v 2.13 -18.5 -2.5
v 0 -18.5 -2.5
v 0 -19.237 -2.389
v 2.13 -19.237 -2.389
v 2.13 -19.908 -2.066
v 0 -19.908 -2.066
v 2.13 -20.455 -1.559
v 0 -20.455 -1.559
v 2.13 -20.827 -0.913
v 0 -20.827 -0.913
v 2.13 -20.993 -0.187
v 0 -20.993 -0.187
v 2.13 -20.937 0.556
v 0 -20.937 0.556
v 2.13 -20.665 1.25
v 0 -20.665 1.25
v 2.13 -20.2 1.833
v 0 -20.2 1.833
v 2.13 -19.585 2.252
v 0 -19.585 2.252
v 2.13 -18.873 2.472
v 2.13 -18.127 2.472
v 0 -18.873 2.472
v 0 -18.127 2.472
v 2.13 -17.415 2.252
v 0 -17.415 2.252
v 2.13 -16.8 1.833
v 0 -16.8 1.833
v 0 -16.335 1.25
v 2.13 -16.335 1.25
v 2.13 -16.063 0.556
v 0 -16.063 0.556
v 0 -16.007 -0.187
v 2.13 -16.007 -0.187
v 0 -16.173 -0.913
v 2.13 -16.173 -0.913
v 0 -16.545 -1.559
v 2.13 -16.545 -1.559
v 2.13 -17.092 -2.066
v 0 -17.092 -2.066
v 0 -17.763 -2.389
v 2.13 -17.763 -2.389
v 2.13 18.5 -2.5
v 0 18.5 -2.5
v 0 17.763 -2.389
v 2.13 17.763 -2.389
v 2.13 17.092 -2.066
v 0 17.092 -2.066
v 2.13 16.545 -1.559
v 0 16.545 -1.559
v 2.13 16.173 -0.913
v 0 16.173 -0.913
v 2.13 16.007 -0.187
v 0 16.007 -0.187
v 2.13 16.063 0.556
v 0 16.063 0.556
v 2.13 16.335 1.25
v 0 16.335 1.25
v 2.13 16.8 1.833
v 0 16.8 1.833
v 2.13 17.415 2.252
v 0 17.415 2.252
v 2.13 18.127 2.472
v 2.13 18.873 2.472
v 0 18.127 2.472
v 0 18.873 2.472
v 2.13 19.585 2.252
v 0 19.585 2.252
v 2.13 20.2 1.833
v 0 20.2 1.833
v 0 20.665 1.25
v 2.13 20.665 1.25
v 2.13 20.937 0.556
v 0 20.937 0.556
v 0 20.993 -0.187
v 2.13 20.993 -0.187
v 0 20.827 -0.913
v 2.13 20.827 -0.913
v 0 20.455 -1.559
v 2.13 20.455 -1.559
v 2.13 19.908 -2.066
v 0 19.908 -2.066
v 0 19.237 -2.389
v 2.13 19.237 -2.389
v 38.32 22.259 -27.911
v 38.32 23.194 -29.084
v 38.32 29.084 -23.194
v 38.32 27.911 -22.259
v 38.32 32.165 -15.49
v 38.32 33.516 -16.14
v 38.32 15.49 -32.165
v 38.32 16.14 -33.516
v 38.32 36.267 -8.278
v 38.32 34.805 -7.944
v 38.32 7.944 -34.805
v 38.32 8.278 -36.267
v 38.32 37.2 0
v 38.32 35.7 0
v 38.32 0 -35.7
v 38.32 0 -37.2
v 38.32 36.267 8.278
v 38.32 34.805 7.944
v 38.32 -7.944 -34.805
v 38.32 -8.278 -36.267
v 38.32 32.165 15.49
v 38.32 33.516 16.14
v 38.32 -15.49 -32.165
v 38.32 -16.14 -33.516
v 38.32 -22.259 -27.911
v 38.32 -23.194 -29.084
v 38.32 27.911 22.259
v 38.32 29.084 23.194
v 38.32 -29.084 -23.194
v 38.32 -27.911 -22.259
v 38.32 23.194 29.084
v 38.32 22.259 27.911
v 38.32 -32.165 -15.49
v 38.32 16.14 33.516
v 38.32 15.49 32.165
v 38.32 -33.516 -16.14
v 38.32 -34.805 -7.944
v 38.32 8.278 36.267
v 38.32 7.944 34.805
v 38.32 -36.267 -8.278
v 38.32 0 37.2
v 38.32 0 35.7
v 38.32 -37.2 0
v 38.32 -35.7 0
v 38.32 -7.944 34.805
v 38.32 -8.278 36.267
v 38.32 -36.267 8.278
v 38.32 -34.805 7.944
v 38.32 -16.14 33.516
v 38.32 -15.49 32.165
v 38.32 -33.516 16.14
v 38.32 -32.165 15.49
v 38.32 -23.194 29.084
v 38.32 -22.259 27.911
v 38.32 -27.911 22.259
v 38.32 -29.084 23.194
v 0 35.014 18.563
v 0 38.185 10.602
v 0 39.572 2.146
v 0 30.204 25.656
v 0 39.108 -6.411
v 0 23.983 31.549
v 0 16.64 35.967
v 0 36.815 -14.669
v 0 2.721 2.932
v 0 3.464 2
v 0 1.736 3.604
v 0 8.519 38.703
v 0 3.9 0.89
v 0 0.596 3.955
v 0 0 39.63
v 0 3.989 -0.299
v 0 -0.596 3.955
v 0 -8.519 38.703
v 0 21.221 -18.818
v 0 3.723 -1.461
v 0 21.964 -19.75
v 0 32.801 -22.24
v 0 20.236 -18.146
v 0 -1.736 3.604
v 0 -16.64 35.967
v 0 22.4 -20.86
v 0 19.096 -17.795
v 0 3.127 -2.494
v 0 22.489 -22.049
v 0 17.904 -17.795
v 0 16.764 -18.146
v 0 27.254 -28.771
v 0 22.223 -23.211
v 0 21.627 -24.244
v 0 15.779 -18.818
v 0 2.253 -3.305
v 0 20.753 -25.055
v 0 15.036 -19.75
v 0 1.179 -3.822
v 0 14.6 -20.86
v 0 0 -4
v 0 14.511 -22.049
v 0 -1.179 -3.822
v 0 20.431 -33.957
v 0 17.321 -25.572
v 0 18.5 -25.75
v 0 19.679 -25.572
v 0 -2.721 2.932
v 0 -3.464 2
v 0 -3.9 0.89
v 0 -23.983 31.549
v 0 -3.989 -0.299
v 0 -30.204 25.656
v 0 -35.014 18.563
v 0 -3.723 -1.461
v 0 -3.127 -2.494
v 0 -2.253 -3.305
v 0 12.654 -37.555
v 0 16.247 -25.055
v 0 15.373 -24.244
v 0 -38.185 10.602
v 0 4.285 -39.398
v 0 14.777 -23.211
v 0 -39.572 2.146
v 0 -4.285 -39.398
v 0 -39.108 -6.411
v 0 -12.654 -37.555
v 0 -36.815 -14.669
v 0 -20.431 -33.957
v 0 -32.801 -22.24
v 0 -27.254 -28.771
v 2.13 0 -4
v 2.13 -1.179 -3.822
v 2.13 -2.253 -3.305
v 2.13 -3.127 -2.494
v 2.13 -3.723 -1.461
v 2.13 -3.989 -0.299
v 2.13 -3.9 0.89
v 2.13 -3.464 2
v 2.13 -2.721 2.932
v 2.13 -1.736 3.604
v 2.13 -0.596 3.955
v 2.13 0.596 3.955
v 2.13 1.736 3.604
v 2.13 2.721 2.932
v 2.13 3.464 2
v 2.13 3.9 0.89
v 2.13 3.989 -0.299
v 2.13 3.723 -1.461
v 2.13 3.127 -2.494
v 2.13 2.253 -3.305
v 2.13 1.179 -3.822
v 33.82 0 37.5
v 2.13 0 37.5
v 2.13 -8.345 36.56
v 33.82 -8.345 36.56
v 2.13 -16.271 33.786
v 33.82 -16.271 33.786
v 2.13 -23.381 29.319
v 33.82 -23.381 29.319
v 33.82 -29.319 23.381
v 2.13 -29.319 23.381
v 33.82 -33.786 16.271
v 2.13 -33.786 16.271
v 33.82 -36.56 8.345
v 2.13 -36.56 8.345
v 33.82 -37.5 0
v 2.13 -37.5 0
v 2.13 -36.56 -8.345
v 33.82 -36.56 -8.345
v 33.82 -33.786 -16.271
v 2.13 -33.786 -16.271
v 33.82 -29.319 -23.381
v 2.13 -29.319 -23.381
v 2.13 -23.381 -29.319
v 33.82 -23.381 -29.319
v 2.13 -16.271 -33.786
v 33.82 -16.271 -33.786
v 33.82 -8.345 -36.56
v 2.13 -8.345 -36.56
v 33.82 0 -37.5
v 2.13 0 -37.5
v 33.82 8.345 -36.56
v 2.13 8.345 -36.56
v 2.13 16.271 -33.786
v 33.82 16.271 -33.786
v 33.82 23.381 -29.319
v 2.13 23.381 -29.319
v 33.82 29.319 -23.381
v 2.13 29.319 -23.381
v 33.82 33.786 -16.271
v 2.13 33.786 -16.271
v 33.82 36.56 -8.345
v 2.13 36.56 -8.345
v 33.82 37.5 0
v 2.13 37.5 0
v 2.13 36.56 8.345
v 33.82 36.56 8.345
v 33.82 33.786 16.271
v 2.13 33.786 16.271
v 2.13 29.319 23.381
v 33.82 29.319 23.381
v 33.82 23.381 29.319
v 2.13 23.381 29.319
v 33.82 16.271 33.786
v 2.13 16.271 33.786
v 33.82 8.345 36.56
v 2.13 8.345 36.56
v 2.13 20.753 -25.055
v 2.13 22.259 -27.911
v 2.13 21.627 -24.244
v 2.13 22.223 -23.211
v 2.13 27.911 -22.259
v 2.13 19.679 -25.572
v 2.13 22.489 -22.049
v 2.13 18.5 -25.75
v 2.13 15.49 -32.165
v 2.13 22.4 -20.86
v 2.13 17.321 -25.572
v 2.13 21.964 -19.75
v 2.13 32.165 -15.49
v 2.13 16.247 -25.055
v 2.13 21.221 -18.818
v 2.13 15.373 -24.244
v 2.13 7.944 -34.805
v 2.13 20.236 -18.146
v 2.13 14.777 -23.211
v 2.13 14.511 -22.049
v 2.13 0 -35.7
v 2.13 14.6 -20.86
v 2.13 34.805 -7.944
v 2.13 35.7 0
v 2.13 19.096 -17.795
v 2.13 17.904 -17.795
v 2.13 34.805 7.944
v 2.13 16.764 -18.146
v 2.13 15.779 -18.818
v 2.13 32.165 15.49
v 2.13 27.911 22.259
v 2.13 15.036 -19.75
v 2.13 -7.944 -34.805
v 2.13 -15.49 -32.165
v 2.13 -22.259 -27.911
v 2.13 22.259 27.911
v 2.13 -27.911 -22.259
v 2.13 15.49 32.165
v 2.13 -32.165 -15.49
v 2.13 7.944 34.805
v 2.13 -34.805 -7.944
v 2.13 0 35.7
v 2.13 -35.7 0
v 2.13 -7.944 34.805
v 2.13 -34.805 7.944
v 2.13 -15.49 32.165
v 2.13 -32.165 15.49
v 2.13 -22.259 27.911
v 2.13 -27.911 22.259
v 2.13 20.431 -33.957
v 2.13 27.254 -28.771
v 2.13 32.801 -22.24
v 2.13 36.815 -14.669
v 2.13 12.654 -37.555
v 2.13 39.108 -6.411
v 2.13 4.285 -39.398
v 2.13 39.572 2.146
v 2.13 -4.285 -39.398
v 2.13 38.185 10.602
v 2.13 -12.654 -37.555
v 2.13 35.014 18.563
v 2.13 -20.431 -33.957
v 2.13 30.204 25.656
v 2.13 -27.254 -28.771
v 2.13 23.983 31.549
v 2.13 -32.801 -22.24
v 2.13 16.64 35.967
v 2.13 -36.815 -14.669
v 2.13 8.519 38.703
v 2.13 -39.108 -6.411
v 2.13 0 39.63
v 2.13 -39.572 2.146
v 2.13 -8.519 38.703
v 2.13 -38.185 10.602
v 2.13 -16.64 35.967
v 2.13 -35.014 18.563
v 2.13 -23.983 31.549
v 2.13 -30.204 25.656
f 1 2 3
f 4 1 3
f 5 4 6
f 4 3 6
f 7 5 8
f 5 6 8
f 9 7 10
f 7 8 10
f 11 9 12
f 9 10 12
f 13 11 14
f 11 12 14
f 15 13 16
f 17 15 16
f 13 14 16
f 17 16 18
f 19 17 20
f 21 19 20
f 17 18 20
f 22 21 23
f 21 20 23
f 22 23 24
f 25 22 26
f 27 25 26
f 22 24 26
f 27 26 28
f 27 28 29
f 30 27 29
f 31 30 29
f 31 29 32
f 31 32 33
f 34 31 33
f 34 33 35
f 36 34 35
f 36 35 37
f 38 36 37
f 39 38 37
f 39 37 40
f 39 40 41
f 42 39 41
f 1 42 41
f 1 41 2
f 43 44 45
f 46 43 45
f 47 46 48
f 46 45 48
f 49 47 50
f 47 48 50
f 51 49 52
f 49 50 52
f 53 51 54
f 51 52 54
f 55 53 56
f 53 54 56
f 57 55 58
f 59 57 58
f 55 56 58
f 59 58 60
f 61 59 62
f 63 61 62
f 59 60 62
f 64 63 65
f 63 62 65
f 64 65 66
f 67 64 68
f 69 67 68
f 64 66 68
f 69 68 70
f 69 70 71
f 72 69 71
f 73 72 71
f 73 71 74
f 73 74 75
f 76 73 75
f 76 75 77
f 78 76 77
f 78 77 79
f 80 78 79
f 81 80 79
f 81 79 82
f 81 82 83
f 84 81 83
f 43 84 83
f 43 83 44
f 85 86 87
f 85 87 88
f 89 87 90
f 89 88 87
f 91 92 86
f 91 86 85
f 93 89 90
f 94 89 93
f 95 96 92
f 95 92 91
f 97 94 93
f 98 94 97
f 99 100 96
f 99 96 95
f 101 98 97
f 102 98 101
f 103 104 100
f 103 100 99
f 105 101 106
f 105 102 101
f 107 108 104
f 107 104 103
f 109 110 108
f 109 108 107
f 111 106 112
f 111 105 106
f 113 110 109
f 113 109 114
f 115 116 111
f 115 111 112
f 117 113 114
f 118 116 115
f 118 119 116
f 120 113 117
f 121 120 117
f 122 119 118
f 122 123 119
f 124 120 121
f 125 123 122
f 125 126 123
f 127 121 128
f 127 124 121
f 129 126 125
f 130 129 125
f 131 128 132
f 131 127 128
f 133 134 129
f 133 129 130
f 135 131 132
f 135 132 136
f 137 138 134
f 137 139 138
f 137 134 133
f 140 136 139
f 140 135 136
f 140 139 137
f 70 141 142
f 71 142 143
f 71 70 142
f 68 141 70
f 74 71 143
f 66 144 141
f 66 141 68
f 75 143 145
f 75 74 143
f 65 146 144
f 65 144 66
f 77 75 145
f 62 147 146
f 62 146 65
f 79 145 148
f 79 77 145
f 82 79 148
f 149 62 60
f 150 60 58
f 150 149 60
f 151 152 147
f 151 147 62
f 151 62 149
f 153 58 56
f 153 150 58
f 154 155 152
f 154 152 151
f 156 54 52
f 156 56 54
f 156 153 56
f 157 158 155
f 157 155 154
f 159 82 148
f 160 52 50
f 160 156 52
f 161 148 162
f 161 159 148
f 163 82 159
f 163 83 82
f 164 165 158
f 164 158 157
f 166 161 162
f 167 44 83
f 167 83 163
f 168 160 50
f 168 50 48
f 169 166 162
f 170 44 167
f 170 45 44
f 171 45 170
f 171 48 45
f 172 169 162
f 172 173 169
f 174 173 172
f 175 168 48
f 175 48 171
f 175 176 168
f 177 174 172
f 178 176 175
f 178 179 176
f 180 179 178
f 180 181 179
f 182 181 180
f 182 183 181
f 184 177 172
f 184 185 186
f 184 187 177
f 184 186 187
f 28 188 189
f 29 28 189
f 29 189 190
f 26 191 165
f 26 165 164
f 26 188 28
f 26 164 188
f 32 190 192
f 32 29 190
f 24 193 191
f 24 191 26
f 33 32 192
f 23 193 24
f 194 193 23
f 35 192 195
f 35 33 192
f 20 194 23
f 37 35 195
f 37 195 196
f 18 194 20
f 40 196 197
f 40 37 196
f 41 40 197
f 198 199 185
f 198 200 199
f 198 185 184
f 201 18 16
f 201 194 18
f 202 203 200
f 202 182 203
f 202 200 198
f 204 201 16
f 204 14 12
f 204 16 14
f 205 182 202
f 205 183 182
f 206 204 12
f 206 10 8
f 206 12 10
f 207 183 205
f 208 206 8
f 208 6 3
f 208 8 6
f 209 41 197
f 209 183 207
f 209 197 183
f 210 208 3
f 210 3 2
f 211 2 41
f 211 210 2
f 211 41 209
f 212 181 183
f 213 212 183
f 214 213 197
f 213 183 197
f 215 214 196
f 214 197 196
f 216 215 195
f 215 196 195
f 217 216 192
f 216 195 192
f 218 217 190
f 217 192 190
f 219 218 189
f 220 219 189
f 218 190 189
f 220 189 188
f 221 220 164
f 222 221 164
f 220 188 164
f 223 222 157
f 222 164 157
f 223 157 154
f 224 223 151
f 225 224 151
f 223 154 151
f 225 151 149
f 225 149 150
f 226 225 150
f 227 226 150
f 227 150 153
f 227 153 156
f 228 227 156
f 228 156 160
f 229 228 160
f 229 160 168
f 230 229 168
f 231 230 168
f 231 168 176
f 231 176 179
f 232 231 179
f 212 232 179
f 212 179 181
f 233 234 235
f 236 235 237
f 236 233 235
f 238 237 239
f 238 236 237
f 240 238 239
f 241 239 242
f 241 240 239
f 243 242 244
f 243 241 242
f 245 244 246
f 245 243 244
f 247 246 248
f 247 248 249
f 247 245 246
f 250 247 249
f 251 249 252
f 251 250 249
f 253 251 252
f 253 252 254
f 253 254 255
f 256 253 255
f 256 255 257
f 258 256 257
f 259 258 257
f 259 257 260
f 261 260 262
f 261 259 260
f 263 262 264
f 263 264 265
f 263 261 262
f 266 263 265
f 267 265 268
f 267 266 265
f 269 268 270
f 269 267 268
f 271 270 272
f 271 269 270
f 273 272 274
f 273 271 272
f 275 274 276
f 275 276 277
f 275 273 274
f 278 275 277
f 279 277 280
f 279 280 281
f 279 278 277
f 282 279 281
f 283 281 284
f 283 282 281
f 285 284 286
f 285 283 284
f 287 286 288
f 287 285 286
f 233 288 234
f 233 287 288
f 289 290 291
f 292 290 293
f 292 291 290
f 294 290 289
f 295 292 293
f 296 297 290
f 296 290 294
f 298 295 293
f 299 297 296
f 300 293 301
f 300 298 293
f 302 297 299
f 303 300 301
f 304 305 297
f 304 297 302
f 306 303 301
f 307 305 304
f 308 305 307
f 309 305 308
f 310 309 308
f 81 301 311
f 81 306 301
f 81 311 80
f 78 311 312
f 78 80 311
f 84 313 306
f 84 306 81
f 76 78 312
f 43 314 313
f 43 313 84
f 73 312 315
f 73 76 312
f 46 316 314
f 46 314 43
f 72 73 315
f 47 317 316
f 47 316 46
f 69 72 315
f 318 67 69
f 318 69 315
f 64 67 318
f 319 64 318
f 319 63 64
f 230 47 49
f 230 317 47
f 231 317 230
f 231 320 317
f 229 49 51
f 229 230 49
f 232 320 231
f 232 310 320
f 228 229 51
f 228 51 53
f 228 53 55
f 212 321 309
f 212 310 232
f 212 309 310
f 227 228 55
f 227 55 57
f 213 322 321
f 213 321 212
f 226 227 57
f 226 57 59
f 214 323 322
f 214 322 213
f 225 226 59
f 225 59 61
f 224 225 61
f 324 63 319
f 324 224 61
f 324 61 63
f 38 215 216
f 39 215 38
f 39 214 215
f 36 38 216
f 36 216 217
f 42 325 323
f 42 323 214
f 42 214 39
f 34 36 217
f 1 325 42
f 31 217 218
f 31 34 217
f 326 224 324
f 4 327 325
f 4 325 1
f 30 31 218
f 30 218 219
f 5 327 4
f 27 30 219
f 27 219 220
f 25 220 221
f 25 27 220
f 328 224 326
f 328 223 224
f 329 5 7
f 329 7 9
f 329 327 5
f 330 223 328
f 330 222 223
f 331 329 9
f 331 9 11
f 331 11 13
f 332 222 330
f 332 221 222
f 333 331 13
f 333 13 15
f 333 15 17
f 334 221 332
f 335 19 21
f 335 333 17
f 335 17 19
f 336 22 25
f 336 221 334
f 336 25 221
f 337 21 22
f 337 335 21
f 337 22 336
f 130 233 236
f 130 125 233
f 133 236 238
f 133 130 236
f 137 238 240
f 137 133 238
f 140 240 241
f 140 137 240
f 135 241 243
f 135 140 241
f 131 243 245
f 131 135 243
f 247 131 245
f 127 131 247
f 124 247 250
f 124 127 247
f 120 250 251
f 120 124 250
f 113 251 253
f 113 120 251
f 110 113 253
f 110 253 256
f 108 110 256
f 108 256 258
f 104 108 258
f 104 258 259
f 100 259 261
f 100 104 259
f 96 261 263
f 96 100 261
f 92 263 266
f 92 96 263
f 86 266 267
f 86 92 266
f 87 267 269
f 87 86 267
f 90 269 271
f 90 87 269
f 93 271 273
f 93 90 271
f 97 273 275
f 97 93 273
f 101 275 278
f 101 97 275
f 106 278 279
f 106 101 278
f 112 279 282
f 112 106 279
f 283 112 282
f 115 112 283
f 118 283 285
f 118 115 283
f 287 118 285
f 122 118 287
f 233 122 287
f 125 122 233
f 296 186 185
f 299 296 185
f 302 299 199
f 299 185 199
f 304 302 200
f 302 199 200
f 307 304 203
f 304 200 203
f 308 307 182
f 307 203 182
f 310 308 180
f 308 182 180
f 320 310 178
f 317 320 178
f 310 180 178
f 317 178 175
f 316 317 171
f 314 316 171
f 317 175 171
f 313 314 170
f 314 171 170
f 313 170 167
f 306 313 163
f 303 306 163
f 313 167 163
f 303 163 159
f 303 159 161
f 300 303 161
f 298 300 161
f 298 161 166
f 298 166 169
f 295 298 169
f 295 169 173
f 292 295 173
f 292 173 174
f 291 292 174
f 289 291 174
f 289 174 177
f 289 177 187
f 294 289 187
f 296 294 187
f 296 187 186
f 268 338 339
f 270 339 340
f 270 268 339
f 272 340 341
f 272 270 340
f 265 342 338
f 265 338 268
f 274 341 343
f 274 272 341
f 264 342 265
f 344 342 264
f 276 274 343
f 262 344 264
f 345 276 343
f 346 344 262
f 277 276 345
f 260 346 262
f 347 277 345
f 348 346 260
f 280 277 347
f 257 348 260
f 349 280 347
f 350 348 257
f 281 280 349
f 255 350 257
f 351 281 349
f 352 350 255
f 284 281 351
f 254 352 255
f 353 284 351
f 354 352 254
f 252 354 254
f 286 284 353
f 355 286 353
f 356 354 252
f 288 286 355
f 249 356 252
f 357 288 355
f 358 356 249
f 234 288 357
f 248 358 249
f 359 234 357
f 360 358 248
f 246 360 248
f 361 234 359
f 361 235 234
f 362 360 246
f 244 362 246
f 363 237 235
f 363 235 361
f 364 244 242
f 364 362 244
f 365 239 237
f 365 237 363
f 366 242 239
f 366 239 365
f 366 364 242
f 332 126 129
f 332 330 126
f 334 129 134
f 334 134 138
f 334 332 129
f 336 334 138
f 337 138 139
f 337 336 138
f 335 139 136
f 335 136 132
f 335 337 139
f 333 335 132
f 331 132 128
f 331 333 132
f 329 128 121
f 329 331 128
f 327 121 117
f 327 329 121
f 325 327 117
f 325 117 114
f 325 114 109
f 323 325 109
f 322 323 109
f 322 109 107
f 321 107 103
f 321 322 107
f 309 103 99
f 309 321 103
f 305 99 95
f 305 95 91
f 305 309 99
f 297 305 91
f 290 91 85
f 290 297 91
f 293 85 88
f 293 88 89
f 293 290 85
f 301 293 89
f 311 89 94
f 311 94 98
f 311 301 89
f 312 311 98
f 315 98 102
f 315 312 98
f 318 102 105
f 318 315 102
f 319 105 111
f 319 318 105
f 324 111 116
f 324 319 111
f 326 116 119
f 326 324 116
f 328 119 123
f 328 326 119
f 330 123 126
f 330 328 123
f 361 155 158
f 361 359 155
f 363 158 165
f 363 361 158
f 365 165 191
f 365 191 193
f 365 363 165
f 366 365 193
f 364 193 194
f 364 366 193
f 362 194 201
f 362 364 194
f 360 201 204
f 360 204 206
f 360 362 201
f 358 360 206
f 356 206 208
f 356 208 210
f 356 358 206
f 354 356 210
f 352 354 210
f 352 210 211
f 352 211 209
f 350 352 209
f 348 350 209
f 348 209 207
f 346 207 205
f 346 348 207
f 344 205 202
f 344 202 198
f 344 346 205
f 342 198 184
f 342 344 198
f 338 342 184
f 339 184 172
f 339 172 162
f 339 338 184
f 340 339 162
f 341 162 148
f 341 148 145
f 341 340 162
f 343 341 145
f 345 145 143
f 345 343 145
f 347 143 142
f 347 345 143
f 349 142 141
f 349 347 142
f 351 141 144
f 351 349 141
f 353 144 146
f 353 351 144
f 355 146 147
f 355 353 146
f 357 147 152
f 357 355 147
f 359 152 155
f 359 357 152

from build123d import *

# Parameters (mm, degrees)
SKETCH001_R   = 4
SKETCH001_R_2 = 2.5
POCKET_DEPTH  = 38.321


with BuildPart() as part:
    # Sketch → Revolution (revolve)
    with BuildSketch(Plane.XZ):
        Polygon((0, 0), (0, 39.63), (2.13, 39.63), (2.13, 37.5), (33.82, 37.5), (38.32, 37.2), (38.32, 35.7), (2.13, 35.7), (2.13, 0), align=None)
    revolve(axis=Axis((0, 0, 0), (1, 0, 0)))

    # Sketch001 (on Face1 of Revolution) → Pocket (cut, through all)
    with BuildSketch(Plane(origin=(0, 0, 0), x_dir=(0, 0, -1), z_dir=(-1, 0, 0))):
        Circle(SKETCH001_R)
        with Locations((0, 18.5)):
            Circle(SKETCH001_R_2)
        with Locations((0, -18.5)):
            Circle(SKETCH001_R_2)
        with Locations((21.75, -18.5)):
            Circle(SKETCH001_R)
    extrude(amount=-POCKET_DEPTH, mode=Mode.SUBTRACT)


solid = part.part
